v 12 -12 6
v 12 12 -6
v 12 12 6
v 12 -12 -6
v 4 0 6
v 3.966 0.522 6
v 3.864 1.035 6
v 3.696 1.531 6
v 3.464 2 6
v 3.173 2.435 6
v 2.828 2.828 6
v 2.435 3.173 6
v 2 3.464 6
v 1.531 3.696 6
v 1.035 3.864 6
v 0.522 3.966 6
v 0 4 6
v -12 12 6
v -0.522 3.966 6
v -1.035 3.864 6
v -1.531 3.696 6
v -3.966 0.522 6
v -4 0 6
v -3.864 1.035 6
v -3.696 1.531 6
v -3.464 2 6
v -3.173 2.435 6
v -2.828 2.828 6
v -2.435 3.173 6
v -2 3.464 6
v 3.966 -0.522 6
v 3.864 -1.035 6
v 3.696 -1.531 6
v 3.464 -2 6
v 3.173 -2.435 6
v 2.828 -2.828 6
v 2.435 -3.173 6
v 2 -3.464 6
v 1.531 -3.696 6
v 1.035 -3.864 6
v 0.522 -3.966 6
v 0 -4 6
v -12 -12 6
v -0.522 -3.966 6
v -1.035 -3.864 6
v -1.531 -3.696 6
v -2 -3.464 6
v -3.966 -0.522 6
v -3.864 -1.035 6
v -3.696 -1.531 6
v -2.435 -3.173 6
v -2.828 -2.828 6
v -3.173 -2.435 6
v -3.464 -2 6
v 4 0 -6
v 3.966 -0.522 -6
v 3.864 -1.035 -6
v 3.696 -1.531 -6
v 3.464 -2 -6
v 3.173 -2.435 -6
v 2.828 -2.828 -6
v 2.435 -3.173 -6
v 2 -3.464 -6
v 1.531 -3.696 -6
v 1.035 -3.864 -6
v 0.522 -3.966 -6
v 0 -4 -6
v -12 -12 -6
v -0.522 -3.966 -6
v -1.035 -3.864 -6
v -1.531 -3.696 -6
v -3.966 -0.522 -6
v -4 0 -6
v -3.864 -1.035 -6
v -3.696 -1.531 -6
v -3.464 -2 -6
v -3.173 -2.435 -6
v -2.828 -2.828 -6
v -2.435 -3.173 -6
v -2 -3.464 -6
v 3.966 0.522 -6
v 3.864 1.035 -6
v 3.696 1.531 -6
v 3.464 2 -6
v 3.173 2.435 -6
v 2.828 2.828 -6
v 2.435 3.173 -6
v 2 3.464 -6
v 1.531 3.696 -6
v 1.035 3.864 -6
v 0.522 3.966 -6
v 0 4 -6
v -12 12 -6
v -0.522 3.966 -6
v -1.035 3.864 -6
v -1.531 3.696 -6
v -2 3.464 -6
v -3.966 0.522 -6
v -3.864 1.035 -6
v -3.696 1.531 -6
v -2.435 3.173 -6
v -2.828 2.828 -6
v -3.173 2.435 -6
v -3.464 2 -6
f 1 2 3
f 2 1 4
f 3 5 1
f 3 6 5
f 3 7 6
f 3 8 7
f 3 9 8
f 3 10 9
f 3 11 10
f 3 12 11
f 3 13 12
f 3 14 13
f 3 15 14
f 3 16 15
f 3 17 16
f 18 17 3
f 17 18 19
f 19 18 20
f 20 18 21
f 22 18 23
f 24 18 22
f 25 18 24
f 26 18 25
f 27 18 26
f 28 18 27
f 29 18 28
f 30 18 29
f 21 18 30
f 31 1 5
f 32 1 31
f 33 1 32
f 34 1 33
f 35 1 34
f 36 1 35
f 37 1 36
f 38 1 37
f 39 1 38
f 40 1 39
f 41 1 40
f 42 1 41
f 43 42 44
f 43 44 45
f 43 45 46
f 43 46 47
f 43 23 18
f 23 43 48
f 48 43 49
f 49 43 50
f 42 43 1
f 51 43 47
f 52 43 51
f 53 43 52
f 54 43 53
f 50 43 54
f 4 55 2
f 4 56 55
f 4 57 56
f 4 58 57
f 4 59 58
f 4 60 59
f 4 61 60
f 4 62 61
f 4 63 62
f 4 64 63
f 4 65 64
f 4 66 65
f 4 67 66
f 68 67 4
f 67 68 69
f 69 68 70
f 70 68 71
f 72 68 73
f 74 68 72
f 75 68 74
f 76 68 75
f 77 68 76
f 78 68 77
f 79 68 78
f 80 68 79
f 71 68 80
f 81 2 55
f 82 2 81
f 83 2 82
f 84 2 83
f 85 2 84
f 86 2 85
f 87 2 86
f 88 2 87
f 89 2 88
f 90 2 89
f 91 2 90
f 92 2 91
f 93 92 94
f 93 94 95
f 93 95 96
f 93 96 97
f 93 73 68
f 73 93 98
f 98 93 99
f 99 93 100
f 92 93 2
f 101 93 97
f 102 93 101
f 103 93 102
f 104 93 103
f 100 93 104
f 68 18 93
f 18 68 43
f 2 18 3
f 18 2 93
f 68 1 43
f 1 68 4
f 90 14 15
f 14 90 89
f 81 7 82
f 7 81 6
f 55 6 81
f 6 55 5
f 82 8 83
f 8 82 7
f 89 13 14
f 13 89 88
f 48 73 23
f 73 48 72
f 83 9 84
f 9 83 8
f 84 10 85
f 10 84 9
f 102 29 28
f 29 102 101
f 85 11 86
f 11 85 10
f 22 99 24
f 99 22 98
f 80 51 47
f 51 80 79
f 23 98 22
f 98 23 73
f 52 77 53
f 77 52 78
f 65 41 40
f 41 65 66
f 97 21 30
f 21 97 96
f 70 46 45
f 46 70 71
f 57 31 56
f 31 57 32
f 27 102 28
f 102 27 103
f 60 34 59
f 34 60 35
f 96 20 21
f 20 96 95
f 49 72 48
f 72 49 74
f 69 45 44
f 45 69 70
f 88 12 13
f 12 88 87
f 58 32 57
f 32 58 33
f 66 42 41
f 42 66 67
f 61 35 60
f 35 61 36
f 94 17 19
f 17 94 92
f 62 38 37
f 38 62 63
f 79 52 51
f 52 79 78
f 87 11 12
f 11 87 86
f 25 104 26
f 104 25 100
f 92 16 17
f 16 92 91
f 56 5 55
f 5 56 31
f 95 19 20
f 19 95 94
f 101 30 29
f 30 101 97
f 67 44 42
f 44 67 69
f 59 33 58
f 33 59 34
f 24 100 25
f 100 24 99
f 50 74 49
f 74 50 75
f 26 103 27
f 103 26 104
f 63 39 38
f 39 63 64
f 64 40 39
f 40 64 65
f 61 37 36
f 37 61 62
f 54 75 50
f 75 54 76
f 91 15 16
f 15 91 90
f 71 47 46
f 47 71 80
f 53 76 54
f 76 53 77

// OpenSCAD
// A parametric block with a centered through-hole.
$fn = 48;
wall = 3;

module perforated_block(size = 24, depth = 12) {
    difference() {
        cube([size, size, depth], center = true);
        cylinder(h = depth + 1, r = size / 6, center = true);
    }
}

perforated_block();
